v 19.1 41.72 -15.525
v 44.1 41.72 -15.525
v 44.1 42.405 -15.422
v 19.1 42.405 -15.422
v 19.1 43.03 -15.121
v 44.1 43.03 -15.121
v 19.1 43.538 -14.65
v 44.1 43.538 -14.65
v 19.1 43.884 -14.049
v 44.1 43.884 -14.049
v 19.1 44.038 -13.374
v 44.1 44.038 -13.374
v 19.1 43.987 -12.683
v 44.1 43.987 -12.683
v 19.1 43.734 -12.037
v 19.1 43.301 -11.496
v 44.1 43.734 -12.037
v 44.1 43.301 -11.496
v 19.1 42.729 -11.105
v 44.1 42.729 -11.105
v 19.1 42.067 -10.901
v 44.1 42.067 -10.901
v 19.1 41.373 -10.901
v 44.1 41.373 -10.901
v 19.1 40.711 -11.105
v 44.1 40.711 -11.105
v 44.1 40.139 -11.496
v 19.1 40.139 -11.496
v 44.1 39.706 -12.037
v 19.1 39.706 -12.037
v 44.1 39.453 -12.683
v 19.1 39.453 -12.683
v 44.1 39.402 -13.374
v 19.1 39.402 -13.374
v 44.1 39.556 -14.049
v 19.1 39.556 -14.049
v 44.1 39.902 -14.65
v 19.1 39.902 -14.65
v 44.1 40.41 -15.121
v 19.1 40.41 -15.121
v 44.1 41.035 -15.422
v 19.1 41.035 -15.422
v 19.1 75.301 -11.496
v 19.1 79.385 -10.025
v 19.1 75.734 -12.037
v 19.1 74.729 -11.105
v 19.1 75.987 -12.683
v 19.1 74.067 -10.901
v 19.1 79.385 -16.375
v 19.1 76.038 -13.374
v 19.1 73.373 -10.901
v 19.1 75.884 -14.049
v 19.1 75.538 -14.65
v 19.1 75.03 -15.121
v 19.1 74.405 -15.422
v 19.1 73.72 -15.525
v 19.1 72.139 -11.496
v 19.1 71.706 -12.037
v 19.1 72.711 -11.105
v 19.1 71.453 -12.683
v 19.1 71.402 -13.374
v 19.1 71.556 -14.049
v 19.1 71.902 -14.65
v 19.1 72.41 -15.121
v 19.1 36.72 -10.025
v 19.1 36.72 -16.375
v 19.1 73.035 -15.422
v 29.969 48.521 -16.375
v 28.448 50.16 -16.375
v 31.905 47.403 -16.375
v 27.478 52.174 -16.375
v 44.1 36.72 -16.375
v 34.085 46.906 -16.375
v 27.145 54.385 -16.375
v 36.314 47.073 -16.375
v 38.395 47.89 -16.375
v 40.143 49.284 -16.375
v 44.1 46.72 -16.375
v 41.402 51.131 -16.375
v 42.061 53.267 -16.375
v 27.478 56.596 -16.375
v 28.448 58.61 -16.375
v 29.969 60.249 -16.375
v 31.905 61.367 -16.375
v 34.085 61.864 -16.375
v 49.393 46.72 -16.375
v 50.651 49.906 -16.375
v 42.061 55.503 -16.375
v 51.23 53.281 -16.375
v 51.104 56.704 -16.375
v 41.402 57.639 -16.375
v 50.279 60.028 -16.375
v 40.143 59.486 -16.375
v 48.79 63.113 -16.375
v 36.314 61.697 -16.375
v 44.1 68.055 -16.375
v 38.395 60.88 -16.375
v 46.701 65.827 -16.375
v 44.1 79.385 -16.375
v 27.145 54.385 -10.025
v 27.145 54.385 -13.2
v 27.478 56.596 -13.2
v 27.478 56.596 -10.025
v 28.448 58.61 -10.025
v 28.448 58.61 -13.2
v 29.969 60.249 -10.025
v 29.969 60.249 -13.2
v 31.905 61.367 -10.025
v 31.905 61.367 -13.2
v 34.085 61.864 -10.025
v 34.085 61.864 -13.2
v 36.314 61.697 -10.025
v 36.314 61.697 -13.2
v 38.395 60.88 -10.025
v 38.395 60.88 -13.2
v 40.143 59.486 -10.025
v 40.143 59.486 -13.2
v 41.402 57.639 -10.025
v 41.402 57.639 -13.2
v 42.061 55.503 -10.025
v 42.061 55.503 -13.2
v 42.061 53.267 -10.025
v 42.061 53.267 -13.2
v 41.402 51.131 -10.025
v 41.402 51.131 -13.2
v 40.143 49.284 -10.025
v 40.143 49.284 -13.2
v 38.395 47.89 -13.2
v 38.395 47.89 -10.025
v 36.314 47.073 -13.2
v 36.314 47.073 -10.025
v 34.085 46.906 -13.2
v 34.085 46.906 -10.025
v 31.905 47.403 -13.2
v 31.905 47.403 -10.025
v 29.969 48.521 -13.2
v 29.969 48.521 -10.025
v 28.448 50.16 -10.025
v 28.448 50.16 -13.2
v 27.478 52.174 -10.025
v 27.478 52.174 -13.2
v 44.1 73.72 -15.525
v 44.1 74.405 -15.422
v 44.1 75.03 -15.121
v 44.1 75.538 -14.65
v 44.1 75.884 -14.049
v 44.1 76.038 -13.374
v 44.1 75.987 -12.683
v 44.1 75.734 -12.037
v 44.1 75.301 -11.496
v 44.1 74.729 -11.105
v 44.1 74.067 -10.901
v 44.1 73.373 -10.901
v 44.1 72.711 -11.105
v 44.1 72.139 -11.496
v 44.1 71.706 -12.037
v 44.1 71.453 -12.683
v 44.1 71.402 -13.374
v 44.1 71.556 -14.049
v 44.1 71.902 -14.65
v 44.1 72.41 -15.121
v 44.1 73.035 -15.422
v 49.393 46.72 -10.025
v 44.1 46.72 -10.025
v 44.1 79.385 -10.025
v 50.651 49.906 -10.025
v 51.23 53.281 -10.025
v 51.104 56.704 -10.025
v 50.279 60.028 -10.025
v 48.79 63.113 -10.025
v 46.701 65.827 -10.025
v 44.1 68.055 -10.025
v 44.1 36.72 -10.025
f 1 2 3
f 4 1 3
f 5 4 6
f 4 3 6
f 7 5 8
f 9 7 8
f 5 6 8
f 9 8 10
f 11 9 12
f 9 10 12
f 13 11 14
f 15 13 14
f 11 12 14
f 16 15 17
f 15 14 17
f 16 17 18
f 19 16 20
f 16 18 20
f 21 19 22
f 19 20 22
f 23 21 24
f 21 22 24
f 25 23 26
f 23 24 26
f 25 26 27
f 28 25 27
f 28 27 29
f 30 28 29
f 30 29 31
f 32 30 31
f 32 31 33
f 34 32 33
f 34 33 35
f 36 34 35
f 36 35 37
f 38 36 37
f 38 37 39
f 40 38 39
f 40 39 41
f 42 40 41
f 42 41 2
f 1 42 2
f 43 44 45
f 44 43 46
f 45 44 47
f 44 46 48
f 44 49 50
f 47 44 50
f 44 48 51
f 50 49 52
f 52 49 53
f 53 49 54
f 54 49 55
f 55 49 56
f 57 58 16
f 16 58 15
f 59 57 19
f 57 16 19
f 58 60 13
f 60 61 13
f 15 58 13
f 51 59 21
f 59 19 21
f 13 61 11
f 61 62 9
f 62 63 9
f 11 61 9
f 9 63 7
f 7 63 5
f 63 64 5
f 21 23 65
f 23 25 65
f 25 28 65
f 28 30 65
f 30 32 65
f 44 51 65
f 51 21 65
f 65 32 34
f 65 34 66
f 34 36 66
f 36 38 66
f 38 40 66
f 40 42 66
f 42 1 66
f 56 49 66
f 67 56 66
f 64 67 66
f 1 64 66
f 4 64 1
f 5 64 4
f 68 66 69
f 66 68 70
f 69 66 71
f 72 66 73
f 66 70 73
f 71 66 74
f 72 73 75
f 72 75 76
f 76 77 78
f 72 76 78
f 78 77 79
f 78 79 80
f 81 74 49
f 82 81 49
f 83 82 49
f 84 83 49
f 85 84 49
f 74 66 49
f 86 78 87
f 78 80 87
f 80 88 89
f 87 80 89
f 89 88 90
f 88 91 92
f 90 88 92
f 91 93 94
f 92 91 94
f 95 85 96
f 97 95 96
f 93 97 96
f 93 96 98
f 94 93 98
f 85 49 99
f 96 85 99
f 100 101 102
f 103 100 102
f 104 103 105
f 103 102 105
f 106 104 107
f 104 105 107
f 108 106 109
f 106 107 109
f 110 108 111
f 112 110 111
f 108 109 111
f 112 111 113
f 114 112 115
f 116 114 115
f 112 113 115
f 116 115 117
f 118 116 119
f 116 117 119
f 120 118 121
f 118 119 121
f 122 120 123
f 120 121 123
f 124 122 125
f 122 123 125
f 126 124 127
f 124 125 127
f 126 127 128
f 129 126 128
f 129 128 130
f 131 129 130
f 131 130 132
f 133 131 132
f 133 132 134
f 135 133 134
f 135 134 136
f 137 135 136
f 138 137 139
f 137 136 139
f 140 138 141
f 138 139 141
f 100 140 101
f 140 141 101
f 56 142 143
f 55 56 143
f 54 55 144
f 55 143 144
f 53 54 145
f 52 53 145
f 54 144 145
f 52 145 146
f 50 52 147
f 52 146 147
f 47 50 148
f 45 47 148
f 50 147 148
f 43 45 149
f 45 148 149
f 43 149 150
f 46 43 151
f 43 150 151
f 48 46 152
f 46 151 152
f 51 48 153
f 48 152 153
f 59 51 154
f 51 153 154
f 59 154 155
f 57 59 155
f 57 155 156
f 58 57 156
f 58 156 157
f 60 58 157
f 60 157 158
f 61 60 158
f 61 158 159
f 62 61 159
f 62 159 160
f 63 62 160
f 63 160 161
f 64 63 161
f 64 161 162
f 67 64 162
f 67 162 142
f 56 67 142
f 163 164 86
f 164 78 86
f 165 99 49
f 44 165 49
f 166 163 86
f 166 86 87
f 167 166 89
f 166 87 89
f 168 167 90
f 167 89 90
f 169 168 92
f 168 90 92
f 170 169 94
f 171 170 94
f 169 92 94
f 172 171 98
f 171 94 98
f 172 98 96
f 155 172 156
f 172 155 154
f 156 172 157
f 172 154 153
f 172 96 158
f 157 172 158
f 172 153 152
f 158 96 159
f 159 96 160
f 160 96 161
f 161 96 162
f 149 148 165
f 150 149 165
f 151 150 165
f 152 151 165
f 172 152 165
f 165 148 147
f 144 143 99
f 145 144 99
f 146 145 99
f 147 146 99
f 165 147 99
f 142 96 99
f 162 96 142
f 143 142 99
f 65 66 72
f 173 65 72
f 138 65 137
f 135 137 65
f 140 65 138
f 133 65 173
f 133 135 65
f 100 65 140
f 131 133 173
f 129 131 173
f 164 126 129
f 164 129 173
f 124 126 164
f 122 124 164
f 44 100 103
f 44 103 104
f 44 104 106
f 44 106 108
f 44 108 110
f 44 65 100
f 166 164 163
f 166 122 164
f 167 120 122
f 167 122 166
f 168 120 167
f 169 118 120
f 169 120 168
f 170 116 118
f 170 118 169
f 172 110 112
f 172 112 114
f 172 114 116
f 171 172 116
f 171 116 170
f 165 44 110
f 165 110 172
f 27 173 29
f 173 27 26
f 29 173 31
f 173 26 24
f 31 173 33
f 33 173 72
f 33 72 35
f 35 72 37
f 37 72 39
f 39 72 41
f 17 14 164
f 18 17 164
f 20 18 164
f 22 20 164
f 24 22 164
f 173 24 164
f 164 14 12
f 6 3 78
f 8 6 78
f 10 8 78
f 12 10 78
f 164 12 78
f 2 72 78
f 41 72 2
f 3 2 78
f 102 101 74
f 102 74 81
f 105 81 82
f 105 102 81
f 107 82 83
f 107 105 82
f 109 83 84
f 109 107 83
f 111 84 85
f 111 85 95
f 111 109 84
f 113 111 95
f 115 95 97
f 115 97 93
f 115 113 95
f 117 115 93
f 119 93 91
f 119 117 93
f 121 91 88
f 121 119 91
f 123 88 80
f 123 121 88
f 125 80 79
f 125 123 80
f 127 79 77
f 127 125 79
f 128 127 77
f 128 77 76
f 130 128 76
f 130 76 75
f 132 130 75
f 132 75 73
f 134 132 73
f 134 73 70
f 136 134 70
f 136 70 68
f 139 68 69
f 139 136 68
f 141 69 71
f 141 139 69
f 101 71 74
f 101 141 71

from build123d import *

# Parameters (mm, degrees)
BOSS_EXTRUDE1_DEPTH      = 3.175
BOSS_EXTRUDE1_DEPTH_BACK = 3.175
SKETCH2_R                = 7.5
CUT_EXTRUDE1_REACH       = 86.824
SKETCH3_R                = 2.325


with BuildPart() as part:
    # Sketch2 → Boss-Extrude1 (new, two sides: drawn at the far end of the back side and taken through both)
    with BuildSketch(Plane(origin=(0, 0, -13.2), x_dir=(-1, 0, 0), z_dir=(0, 0, -1)).offset(-BOSS_EXTRUDE1_DEPTH_BACK)):
        with BuildLine():
            Line((-19.1, 36.72), (-44.1, 36.72))
            Line((-44.1, 36.72), (-44.1, 46.72))
            Line((-44.1, 46.72), (-49.39334567, 46.72))
            ThreePointArc((-49.39334567, 46.72), (-50.77714312, 58.387484646), (-44.1, 68.055))
            Line((-44.1, 68.055), (-44.1, 79.385))
            Line((-44.1, 79.385), (-19.1, 79.385))
            Line((-19.1, 79.385), (-19.1, 36.72))
        make_face()
        with Locations((-34.645, 54.385)):
            Circle(SKETCH2_R, mode=Mode.SUBTRACT)
    extrude(amount=BOSS_EXTRUDE1_DEPTH + BOSS_EXTRUDE1_DEPTH_BACK)

    # Sketch3 → Cut-Extrude1 (cut, up to next)
    with BuildSketch(Plane(origin=(44.1, 0, 0), x_dir=(0, 0, -1), z_dir=(1, 0, 0)), mode=Mode.PRIVATE) as cut_extrude1_sk1:
        with Locations((13.2, 41.72)):
            Circle(SKETCH3_R)
    cut_extrude1_tool1 = extrude(cut_extrude1_sk1.sketch, amount=-CUT_EXTRUDE1_REACH, mode=Mode.PRIVATE) & part.part
    # Sketch3 → Cut-Extrude1 (cut, up to next)
    with BuildSketch(Plane(origin=(44.1, 0, 0), x_dir=(0, 0, -1), z_dir=(1, 0, 0)), mode=Mode.PRIVATE) as cut_extrude1_sk2:
        with Locations((13.2, 73.72)):
            Circle(SKETCH3_R)
    cut_extrude1_tool2 = extrude(cut_extrude1_sk2.sketch, amount=-CUT_EXTRUDE1_REACH, mode=Mode.PRIVATE) & part.part
    add(cut_extrude1_tool1.solids().sort_by_distance((44.1, 41.72, -13.2))[0], mode=Mode.SUBTRACT)
    add(cut_extrude1_tool2.solids().sort_by_distance((44.1, 73.72, -13.2))[0], mode=Mode.SUBTRACT)


solid = part.part
